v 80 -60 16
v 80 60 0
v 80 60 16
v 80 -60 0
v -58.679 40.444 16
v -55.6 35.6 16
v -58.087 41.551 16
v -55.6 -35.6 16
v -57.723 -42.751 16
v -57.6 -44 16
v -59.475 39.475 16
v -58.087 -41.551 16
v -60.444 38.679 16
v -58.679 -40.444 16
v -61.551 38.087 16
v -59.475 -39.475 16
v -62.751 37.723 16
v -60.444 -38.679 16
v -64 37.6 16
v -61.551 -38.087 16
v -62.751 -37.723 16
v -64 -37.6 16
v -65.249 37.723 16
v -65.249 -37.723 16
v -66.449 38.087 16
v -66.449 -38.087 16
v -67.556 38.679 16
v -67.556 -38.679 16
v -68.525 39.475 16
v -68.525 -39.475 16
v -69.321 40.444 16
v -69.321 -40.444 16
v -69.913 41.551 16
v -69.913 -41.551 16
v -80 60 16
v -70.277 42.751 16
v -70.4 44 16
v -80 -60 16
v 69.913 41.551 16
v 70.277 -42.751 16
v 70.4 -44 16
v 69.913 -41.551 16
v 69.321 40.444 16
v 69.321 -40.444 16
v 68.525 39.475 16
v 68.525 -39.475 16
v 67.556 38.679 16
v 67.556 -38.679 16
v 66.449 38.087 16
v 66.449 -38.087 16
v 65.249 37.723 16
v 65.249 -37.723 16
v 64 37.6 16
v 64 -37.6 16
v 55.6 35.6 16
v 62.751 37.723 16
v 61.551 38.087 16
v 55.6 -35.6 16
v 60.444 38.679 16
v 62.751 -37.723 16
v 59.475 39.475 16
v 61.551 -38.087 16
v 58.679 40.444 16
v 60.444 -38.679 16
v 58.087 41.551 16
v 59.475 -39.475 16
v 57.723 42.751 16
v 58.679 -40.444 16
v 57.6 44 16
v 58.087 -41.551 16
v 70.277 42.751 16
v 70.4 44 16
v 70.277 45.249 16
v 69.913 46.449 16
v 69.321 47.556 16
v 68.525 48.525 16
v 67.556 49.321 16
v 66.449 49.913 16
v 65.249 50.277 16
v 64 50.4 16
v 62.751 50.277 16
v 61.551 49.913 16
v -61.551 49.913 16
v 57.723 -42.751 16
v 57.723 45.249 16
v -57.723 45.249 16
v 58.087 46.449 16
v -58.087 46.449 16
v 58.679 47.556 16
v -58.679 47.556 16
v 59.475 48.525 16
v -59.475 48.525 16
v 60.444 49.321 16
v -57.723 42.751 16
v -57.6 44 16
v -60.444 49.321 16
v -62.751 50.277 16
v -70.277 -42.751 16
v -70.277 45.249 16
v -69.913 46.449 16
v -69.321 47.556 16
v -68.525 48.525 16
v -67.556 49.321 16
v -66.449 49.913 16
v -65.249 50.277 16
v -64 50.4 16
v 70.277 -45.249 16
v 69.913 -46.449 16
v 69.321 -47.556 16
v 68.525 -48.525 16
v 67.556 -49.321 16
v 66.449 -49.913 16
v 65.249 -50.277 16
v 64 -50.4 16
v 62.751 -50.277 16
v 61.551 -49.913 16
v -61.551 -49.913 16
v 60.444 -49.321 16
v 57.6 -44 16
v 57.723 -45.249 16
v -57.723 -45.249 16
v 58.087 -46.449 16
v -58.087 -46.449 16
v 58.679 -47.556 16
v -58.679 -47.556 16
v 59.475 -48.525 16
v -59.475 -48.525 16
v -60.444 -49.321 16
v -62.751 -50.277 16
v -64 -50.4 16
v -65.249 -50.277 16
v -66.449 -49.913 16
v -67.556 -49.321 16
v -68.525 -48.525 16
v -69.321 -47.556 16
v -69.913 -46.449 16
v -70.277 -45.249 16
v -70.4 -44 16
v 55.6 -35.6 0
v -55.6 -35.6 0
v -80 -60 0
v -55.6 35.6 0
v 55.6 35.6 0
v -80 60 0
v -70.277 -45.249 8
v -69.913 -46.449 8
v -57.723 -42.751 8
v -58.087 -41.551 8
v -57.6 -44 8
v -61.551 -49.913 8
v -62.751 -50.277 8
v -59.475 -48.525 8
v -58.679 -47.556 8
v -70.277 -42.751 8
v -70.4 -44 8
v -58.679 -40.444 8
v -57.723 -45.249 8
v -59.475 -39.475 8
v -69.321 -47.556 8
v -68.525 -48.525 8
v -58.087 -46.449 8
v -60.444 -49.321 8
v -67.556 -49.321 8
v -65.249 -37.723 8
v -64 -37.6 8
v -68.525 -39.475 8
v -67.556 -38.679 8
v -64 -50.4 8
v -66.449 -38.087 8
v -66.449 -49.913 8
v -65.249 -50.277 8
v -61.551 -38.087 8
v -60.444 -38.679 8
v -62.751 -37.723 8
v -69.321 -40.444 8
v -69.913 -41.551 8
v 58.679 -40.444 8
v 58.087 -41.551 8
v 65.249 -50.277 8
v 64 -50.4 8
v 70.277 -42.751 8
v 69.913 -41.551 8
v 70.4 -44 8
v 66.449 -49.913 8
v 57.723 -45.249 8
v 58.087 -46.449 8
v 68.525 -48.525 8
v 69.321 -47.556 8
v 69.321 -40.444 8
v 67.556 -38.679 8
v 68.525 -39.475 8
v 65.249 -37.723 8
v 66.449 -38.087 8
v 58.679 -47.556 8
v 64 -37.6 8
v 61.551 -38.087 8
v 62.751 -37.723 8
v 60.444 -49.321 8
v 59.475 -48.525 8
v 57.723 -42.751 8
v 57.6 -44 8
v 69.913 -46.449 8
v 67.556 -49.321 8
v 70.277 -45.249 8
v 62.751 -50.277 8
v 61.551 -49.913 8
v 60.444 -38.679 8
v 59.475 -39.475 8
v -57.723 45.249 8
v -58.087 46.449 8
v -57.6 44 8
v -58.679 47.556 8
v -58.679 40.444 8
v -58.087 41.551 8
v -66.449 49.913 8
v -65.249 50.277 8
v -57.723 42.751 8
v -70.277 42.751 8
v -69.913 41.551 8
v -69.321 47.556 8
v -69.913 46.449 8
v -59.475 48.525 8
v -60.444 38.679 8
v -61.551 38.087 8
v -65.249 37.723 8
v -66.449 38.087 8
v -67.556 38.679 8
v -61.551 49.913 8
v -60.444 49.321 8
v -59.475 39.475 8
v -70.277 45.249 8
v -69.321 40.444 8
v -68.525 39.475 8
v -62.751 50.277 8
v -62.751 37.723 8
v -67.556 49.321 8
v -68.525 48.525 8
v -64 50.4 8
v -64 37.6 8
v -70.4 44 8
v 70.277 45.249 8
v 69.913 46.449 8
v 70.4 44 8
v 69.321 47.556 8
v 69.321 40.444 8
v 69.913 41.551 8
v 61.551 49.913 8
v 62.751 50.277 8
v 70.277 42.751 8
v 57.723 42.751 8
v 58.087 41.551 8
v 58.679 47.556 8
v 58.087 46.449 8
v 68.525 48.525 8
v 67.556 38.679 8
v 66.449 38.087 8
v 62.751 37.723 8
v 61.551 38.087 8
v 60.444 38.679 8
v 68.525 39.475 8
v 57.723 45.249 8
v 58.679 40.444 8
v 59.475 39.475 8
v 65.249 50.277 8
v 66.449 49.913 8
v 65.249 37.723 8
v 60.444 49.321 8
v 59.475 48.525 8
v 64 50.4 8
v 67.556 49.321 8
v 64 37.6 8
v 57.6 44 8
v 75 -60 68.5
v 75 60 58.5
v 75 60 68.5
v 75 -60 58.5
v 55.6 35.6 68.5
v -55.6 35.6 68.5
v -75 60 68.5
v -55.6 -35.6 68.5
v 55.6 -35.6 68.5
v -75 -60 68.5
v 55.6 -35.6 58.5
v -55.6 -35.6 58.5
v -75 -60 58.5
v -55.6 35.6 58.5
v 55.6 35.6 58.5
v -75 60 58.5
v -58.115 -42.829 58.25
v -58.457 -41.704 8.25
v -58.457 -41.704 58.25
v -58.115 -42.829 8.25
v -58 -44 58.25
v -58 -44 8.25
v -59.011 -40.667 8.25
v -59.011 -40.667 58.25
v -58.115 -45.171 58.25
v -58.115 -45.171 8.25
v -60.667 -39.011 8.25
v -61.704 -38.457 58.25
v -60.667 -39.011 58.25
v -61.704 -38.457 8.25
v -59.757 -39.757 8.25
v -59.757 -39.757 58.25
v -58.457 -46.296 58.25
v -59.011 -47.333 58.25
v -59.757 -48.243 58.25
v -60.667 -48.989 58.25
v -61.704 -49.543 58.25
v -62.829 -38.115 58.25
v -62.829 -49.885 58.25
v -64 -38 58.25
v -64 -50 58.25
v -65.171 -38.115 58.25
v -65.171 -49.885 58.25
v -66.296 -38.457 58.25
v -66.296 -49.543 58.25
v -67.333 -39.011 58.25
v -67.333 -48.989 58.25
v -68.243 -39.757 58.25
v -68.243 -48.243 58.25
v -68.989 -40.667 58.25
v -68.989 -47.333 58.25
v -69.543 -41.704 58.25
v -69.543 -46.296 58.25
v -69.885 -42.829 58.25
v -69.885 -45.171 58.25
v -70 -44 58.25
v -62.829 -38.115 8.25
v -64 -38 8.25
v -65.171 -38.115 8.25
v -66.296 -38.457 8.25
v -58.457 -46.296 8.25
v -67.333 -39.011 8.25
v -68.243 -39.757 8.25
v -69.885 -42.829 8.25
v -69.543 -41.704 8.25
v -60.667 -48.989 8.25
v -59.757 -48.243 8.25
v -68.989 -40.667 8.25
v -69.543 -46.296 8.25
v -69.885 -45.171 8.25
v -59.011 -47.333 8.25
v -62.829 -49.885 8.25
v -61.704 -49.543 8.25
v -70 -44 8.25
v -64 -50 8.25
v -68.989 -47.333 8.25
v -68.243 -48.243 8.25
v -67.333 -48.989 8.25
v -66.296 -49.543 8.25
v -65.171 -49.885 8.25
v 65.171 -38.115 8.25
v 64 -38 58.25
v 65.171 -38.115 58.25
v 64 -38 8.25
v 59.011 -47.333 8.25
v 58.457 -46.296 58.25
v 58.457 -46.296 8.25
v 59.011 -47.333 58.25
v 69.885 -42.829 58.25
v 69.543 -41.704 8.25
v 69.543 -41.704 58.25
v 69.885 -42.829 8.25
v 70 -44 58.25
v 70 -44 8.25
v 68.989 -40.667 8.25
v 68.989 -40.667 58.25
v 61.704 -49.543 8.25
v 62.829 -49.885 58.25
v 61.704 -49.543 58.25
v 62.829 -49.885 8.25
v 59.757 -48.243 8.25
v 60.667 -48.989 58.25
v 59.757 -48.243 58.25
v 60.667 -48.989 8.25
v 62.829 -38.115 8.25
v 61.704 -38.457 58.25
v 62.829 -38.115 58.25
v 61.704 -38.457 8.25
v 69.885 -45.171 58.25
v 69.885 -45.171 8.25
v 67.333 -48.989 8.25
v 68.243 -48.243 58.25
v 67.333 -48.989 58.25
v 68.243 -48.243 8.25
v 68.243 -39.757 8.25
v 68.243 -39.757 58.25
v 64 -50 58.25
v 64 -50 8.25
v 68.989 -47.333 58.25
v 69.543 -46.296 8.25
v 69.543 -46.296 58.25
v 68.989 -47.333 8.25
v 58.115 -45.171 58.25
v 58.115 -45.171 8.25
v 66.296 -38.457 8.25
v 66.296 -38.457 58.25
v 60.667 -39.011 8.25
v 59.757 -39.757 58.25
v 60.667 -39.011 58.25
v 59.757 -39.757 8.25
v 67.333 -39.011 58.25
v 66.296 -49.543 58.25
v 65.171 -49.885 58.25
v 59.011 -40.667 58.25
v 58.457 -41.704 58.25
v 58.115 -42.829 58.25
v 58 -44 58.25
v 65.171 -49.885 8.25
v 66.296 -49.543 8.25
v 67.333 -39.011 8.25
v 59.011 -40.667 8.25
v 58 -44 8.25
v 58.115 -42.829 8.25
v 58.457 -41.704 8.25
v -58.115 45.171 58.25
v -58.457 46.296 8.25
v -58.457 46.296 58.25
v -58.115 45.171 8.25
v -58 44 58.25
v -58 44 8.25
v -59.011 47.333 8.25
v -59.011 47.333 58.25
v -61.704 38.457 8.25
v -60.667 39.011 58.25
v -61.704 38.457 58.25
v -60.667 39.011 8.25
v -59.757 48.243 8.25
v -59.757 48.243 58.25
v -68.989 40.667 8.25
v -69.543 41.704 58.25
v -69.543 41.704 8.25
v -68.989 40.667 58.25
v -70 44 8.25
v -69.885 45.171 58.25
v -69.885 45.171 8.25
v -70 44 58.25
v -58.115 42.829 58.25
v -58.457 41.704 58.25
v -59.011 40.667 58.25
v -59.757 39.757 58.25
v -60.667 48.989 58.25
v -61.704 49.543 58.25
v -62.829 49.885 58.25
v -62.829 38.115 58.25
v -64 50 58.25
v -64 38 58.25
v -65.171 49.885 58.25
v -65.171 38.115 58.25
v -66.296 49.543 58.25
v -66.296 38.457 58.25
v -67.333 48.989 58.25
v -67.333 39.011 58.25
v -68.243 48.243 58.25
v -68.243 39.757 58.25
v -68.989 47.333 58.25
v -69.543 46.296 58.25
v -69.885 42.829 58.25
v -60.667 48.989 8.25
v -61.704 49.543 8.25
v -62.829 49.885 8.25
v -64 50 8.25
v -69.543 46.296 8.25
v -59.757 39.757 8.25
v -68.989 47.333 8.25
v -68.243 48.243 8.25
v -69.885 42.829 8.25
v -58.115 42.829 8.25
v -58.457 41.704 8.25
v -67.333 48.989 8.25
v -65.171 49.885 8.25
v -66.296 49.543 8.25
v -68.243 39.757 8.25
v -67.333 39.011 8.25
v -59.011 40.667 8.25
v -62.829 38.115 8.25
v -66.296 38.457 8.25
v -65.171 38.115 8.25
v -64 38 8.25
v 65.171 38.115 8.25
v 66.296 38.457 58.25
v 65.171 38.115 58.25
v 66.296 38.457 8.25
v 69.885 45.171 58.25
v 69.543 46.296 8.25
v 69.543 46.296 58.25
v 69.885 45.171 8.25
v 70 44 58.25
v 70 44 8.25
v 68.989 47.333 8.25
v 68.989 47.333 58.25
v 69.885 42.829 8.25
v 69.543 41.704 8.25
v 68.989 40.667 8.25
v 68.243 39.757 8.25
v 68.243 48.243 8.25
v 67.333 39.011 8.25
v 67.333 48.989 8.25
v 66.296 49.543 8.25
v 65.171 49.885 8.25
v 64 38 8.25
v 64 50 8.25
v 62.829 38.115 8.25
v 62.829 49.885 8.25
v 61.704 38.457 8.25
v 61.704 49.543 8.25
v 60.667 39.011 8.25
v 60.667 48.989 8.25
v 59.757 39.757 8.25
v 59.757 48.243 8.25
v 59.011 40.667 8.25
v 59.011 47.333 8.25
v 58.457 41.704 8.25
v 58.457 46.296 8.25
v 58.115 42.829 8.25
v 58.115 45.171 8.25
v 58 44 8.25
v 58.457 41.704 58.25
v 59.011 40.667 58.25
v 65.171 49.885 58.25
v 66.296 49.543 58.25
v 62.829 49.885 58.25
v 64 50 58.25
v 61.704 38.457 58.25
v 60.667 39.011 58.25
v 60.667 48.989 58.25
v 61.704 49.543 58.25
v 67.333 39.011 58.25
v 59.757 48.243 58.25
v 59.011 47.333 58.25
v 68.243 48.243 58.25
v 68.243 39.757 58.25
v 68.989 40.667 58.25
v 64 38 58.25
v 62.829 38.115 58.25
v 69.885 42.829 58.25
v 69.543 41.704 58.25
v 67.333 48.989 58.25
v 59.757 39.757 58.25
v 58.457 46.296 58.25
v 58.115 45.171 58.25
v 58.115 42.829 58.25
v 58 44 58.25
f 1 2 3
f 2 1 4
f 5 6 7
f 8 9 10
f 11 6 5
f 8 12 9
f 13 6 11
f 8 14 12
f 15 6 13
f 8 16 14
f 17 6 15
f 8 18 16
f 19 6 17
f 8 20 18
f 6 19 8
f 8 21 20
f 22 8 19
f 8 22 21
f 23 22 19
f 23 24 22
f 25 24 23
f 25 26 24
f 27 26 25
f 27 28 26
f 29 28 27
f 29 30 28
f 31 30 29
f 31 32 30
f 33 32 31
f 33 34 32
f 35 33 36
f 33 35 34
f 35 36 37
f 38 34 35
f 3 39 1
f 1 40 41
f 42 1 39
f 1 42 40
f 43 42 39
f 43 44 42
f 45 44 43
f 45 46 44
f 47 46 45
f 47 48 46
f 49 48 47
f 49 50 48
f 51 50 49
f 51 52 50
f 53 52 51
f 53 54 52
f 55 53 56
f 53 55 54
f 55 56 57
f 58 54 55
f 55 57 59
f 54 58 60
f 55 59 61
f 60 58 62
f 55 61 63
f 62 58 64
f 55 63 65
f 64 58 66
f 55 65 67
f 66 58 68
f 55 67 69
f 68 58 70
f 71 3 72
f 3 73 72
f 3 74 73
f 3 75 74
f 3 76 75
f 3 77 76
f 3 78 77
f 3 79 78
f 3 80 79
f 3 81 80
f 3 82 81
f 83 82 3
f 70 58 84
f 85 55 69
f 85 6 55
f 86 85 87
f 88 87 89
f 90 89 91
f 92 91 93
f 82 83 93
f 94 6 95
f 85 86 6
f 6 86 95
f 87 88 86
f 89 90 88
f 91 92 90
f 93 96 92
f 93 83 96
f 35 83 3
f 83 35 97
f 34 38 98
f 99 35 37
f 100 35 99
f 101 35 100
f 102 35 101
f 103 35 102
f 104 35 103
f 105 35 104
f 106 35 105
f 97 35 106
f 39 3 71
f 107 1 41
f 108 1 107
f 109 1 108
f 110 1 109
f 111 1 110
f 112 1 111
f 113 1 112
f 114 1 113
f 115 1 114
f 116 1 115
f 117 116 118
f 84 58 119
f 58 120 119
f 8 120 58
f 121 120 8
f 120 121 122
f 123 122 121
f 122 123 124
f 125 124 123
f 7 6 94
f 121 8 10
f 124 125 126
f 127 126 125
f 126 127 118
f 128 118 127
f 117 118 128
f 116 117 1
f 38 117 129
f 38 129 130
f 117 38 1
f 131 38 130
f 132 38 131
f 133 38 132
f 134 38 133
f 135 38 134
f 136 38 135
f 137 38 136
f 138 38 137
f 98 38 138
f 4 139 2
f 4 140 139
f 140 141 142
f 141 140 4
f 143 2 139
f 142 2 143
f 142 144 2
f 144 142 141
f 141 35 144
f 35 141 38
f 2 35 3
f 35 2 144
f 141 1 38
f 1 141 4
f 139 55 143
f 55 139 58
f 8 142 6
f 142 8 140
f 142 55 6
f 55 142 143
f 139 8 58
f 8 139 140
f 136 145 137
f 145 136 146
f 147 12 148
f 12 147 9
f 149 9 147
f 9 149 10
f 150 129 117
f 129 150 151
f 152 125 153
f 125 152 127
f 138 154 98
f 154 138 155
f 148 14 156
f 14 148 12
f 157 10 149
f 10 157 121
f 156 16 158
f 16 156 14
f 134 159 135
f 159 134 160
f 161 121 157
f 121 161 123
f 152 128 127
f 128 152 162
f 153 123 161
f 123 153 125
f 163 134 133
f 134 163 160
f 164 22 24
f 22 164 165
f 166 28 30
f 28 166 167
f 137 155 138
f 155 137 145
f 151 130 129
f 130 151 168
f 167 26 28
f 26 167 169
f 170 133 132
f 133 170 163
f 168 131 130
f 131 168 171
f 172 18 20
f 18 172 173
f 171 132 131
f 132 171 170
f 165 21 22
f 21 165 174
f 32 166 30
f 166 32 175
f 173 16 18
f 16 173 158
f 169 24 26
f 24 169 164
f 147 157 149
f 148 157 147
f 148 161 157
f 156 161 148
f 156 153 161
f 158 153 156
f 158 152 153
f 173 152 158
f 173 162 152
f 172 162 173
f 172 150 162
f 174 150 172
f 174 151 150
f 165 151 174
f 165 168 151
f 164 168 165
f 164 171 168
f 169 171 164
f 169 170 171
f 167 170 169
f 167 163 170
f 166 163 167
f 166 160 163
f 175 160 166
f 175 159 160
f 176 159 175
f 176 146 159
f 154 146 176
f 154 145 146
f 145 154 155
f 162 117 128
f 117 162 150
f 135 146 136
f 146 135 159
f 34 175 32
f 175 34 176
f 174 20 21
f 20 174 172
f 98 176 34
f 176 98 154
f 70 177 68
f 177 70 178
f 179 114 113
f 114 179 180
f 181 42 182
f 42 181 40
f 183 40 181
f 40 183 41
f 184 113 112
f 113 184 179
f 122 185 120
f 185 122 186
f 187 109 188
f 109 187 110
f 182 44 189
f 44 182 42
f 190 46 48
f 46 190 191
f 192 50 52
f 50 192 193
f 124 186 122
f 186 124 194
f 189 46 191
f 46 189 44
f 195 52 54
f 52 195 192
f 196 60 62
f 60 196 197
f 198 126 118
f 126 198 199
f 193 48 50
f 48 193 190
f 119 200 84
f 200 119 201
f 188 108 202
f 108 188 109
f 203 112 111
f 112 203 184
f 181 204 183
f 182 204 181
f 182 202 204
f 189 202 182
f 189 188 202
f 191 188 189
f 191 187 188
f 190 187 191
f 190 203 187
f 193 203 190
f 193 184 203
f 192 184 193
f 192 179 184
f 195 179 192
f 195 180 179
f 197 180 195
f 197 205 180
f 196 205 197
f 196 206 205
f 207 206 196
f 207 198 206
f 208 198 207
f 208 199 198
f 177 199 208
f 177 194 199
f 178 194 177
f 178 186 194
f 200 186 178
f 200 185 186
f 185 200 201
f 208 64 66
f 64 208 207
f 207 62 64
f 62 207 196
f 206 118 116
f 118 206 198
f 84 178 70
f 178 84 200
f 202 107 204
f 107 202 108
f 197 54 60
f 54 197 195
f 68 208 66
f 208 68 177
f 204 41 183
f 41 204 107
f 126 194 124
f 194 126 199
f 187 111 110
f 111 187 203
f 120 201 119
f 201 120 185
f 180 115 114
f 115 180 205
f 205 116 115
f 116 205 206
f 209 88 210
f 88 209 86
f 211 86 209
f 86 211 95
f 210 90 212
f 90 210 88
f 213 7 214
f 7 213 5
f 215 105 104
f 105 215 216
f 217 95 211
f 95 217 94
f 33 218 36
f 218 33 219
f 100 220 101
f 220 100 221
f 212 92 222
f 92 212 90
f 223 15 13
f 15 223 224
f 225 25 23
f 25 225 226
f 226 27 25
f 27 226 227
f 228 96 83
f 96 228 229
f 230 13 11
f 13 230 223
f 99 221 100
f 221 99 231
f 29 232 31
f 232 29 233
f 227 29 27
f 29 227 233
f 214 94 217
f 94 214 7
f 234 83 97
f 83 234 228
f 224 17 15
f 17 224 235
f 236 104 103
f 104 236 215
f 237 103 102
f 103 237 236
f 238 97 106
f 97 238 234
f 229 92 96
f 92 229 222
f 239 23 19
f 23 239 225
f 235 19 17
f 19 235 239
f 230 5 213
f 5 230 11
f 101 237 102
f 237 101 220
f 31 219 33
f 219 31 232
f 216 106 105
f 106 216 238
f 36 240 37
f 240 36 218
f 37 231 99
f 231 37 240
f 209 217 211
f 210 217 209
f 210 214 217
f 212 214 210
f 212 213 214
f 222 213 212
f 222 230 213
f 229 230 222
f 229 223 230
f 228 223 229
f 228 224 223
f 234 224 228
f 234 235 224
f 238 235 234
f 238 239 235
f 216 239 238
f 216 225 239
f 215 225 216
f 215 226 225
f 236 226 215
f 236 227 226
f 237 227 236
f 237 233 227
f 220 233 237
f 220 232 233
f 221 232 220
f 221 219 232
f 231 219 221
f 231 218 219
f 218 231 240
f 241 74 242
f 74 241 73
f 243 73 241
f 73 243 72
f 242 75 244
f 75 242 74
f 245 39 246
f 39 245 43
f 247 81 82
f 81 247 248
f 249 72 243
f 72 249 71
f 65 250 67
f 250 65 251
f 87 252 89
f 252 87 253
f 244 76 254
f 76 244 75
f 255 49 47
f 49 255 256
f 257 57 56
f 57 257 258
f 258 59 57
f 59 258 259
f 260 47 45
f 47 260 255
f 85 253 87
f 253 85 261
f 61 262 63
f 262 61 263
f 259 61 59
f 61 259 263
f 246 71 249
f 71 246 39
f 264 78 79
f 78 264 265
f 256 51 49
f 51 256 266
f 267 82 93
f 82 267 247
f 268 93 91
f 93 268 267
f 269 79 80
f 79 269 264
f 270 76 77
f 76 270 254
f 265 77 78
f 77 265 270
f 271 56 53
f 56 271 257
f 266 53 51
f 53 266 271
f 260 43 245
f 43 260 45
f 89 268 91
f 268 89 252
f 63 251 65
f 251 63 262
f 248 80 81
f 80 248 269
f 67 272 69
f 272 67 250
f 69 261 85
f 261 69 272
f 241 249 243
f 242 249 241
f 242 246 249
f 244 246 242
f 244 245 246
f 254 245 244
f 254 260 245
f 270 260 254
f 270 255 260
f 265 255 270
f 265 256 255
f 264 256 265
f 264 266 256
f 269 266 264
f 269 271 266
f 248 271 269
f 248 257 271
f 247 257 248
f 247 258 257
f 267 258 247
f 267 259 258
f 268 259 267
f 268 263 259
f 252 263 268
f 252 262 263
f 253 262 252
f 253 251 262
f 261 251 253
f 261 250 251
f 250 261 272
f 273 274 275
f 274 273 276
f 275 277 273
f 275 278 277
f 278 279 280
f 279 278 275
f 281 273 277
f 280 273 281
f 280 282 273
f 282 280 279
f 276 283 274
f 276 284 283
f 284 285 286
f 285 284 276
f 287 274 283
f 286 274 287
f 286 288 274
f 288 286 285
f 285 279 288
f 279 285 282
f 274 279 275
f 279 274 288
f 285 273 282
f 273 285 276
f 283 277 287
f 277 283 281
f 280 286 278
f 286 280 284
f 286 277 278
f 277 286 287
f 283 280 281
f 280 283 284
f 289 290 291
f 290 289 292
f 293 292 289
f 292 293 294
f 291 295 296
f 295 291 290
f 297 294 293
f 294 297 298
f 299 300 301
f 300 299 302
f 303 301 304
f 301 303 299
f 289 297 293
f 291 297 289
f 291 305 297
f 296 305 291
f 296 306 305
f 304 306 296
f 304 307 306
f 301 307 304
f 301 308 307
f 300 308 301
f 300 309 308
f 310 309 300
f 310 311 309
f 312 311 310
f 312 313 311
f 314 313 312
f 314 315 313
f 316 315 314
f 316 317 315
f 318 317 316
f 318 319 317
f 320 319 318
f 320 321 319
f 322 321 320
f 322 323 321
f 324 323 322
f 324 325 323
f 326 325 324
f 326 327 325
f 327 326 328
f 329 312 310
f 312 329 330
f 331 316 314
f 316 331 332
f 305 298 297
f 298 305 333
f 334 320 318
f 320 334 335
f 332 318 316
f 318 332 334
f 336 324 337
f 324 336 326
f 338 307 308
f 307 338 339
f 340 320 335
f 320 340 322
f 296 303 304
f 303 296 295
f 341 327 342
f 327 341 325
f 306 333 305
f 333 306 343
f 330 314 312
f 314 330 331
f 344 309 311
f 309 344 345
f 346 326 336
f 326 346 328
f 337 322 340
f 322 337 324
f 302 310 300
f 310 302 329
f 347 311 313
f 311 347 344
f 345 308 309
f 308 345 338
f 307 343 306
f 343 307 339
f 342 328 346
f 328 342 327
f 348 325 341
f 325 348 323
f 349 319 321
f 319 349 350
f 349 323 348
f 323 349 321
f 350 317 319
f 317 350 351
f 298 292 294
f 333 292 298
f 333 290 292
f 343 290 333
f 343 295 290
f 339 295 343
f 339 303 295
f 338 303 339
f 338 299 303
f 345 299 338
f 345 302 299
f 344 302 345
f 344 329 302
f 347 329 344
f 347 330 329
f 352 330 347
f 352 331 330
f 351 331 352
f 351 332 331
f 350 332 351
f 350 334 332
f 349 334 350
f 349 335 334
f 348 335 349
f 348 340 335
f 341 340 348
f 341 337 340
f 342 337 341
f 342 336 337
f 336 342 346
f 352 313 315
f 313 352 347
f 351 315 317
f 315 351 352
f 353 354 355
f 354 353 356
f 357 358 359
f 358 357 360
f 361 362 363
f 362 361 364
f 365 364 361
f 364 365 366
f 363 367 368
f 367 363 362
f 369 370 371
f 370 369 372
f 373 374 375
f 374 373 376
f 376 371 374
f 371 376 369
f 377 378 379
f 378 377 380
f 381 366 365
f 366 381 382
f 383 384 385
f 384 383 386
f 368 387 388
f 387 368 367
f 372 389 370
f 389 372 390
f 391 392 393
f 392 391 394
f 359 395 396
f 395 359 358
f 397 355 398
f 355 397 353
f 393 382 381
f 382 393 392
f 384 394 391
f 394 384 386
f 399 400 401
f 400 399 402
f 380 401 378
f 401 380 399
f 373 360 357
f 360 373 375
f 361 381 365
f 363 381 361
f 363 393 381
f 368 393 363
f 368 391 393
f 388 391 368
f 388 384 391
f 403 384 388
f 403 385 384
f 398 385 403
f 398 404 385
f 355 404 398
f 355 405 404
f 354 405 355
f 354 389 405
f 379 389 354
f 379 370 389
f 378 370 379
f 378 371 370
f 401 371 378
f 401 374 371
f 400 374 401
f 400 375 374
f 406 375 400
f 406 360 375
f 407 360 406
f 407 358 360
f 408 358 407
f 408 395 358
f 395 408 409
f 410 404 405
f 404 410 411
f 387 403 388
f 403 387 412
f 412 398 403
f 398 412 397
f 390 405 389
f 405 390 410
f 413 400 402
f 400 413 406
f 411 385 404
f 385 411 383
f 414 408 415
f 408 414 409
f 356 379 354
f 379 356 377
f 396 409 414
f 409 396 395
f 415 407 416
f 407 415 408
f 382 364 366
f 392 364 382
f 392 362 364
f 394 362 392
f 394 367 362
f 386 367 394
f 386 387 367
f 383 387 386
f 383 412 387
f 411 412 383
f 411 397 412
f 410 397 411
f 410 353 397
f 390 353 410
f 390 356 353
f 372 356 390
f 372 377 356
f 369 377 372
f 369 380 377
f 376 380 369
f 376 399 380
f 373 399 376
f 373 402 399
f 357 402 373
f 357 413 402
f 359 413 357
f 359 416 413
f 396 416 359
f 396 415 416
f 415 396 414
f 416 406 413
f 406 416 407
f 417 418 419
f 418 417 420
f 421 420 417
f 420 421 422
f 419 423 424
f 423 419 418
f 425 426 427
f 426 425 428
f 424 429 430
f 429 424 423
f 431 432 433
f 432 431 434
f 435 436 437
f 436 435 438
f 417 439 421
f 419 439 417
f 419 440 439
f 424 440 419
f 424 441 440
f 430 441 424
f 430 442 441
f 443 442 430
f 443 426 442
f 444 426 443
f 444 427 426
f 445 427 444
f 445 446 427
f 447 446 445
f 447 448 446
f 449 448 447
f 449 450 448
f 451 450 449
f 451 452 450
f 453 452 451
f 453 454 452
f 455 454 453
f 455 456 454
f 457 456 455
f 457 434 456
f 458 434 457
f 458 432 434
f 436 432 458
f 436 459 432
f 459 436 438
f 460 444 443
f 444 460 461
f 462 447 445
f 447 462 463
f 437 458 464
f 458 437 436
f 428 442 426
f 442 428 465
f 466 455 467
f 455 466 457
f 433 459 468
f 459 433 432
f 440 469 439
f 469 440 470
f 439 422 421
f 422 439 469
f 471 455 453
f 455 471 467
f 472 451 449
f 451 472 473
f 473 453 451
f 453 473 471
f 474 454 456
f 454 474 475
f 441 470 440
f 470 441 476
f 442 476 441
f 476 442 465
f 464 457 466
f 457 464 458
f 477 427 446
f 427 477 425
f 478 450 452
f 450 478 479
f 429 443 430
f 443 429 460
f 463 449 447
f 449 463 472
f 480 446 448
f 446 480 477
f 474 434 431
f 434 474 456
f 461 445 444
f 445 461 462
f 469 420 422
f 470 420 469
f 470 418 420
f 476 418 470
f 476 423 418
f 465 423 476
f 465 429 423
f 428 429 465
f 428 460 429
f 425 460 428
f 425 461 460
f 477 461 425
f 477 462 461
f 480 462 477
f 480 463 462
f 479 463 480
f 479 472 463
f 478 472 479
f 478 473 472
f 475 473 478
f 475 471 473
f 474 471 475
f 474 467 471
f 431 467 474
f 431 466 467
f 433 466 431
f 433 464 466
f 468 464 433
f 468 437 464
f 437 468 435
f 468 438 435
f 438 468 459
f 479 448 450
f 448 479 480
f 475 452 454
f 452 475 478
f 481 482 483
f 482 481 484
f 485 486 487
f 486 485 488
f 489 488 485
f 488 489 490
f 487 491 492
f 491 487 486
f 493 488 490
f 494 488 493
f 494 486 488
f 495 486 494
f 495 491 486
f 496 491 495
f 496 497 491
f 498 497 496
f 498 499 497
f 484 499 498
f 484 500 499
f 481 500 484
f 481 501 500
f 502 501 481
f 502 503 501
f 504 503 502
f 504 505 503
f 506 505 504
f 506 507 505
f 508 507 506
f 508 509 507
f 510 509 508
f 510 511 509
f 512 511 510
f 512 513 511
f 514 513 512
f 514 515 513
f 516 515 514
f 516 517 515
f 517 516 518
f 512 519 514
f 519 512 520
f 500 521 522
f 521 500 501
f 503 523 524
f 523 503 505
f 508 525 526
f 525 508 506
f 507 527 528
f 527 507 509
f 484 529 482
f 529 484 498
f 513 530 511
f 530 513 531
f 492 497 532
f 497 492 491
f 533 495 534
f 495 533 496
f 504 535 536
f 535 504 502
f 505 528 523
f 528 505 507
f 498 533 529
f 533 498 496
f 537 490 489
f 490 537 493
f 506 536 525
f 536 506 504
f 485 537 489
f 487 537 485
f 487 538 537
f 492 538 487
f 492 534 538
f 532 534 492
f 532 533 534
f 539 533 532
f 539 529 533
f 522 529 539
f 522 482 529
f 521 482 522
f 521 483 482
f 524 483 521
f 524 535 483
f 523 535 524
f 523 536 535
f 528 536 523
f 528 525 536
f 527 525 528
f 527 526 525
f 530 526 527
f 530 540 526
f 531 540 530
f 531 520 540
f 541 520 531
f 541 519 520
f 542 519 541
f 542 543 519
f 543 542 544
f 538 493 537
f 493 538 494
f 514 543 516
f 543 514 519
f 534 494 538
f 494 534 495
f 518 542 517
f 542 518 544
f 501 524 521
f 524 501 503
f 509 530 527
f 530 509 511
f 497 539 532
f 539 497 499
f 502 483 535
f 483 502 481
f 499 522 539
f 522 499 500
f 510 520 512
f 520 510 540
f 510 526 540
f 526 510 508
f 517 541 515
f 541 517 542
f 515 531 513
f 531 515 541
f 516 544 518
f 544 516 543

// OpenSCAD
$fn = 32;

// ------------------------------------------------------------------------
// Frame cube: base 160 x 120 mm, posts 50 mm tall
// Every part is its own module, assembly() places every instance.
// ------------------------------------------------------------------------

// --- part 1 ---
module base_frame() {
  difference() {
    translate([-80, -60, 0]) cube([160, 120, 16]);
    translate([-55.6, -35.6, -1]) cube([111.2, 71.2, 18]);
    translate([-64, -44, 8]) cylinder(h = 9, d = 12.8);
    translate([64, -44, 8]) cylinder(h = 9, d = 12.8);
    translate([-64, 44, 8]) cylinder(h = 9, d = 12.8);
    translate([64, 44, 8]) cylinder(h = 9, d = 12.8);
  }
}

// --- part 2 ---
module corner_post() {
  cylinder(h = 50, d = 12);
}

// --- part 3 ---
module top_frame() {
  difference() {
    translate([-75, -60, 0]) cube([150, 120, 10]);
    translate([-55.6, -35.6, -1]) cube([111.2, 71.2, 12]);
  }
}

// --- assembly ---
module assembly() {
  color([0.80, 0.24, 0.20]) translate([0, 0, 0]) rotate([0, 0, 0]) base_frame();
  color([0.20, 0.45, 0.75]) translate([-64, -44, 8.25]) rotate([0, 0, 0]) corner_post();
  color([0.25, 0.62, 0.32]) translate([64, -44, 8.25]) rotate([0, 0, 0]) corner_post();
  color([0.92, 0.70, 0.18]) translate([-64, 44, 8.25]) rotate([0, 0, 0]) corner_post();
  color([0.58, 0.35, 0.70]) translate([64, 44, 8.25]) rotate([0, 0, 0]) corner_post();
  color([0.16, 0.66, 0.66]) translate([0, 0, 58.5]) rotate([0, 0, 0]) top_frame();
}

assembly();
